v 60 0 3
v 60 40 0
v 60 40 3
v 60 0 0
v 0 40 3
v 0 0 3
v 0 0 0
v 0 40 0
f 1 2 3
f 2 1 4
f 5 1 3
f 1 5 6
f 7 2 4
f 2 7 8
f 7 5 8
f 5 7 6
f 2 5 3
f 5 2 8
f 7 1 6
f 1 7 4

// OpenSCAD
plate_w = 60;
plate_h = 40;
plate_t = 3;

circle_d = 20;
circle_t = 3; // zelfde dikte als plaat

// Basisplaat
translate([0,0,0])
    cube([plate_w, plate_h, plate_t], center=false);

// Rondje (apart object)
translate([plate_w/2 - circle_d/2, plate_h/2 - circle_d/2, 0])
    cylinder(h=circle_t, d=circle_d, center=false, $fn=96);
